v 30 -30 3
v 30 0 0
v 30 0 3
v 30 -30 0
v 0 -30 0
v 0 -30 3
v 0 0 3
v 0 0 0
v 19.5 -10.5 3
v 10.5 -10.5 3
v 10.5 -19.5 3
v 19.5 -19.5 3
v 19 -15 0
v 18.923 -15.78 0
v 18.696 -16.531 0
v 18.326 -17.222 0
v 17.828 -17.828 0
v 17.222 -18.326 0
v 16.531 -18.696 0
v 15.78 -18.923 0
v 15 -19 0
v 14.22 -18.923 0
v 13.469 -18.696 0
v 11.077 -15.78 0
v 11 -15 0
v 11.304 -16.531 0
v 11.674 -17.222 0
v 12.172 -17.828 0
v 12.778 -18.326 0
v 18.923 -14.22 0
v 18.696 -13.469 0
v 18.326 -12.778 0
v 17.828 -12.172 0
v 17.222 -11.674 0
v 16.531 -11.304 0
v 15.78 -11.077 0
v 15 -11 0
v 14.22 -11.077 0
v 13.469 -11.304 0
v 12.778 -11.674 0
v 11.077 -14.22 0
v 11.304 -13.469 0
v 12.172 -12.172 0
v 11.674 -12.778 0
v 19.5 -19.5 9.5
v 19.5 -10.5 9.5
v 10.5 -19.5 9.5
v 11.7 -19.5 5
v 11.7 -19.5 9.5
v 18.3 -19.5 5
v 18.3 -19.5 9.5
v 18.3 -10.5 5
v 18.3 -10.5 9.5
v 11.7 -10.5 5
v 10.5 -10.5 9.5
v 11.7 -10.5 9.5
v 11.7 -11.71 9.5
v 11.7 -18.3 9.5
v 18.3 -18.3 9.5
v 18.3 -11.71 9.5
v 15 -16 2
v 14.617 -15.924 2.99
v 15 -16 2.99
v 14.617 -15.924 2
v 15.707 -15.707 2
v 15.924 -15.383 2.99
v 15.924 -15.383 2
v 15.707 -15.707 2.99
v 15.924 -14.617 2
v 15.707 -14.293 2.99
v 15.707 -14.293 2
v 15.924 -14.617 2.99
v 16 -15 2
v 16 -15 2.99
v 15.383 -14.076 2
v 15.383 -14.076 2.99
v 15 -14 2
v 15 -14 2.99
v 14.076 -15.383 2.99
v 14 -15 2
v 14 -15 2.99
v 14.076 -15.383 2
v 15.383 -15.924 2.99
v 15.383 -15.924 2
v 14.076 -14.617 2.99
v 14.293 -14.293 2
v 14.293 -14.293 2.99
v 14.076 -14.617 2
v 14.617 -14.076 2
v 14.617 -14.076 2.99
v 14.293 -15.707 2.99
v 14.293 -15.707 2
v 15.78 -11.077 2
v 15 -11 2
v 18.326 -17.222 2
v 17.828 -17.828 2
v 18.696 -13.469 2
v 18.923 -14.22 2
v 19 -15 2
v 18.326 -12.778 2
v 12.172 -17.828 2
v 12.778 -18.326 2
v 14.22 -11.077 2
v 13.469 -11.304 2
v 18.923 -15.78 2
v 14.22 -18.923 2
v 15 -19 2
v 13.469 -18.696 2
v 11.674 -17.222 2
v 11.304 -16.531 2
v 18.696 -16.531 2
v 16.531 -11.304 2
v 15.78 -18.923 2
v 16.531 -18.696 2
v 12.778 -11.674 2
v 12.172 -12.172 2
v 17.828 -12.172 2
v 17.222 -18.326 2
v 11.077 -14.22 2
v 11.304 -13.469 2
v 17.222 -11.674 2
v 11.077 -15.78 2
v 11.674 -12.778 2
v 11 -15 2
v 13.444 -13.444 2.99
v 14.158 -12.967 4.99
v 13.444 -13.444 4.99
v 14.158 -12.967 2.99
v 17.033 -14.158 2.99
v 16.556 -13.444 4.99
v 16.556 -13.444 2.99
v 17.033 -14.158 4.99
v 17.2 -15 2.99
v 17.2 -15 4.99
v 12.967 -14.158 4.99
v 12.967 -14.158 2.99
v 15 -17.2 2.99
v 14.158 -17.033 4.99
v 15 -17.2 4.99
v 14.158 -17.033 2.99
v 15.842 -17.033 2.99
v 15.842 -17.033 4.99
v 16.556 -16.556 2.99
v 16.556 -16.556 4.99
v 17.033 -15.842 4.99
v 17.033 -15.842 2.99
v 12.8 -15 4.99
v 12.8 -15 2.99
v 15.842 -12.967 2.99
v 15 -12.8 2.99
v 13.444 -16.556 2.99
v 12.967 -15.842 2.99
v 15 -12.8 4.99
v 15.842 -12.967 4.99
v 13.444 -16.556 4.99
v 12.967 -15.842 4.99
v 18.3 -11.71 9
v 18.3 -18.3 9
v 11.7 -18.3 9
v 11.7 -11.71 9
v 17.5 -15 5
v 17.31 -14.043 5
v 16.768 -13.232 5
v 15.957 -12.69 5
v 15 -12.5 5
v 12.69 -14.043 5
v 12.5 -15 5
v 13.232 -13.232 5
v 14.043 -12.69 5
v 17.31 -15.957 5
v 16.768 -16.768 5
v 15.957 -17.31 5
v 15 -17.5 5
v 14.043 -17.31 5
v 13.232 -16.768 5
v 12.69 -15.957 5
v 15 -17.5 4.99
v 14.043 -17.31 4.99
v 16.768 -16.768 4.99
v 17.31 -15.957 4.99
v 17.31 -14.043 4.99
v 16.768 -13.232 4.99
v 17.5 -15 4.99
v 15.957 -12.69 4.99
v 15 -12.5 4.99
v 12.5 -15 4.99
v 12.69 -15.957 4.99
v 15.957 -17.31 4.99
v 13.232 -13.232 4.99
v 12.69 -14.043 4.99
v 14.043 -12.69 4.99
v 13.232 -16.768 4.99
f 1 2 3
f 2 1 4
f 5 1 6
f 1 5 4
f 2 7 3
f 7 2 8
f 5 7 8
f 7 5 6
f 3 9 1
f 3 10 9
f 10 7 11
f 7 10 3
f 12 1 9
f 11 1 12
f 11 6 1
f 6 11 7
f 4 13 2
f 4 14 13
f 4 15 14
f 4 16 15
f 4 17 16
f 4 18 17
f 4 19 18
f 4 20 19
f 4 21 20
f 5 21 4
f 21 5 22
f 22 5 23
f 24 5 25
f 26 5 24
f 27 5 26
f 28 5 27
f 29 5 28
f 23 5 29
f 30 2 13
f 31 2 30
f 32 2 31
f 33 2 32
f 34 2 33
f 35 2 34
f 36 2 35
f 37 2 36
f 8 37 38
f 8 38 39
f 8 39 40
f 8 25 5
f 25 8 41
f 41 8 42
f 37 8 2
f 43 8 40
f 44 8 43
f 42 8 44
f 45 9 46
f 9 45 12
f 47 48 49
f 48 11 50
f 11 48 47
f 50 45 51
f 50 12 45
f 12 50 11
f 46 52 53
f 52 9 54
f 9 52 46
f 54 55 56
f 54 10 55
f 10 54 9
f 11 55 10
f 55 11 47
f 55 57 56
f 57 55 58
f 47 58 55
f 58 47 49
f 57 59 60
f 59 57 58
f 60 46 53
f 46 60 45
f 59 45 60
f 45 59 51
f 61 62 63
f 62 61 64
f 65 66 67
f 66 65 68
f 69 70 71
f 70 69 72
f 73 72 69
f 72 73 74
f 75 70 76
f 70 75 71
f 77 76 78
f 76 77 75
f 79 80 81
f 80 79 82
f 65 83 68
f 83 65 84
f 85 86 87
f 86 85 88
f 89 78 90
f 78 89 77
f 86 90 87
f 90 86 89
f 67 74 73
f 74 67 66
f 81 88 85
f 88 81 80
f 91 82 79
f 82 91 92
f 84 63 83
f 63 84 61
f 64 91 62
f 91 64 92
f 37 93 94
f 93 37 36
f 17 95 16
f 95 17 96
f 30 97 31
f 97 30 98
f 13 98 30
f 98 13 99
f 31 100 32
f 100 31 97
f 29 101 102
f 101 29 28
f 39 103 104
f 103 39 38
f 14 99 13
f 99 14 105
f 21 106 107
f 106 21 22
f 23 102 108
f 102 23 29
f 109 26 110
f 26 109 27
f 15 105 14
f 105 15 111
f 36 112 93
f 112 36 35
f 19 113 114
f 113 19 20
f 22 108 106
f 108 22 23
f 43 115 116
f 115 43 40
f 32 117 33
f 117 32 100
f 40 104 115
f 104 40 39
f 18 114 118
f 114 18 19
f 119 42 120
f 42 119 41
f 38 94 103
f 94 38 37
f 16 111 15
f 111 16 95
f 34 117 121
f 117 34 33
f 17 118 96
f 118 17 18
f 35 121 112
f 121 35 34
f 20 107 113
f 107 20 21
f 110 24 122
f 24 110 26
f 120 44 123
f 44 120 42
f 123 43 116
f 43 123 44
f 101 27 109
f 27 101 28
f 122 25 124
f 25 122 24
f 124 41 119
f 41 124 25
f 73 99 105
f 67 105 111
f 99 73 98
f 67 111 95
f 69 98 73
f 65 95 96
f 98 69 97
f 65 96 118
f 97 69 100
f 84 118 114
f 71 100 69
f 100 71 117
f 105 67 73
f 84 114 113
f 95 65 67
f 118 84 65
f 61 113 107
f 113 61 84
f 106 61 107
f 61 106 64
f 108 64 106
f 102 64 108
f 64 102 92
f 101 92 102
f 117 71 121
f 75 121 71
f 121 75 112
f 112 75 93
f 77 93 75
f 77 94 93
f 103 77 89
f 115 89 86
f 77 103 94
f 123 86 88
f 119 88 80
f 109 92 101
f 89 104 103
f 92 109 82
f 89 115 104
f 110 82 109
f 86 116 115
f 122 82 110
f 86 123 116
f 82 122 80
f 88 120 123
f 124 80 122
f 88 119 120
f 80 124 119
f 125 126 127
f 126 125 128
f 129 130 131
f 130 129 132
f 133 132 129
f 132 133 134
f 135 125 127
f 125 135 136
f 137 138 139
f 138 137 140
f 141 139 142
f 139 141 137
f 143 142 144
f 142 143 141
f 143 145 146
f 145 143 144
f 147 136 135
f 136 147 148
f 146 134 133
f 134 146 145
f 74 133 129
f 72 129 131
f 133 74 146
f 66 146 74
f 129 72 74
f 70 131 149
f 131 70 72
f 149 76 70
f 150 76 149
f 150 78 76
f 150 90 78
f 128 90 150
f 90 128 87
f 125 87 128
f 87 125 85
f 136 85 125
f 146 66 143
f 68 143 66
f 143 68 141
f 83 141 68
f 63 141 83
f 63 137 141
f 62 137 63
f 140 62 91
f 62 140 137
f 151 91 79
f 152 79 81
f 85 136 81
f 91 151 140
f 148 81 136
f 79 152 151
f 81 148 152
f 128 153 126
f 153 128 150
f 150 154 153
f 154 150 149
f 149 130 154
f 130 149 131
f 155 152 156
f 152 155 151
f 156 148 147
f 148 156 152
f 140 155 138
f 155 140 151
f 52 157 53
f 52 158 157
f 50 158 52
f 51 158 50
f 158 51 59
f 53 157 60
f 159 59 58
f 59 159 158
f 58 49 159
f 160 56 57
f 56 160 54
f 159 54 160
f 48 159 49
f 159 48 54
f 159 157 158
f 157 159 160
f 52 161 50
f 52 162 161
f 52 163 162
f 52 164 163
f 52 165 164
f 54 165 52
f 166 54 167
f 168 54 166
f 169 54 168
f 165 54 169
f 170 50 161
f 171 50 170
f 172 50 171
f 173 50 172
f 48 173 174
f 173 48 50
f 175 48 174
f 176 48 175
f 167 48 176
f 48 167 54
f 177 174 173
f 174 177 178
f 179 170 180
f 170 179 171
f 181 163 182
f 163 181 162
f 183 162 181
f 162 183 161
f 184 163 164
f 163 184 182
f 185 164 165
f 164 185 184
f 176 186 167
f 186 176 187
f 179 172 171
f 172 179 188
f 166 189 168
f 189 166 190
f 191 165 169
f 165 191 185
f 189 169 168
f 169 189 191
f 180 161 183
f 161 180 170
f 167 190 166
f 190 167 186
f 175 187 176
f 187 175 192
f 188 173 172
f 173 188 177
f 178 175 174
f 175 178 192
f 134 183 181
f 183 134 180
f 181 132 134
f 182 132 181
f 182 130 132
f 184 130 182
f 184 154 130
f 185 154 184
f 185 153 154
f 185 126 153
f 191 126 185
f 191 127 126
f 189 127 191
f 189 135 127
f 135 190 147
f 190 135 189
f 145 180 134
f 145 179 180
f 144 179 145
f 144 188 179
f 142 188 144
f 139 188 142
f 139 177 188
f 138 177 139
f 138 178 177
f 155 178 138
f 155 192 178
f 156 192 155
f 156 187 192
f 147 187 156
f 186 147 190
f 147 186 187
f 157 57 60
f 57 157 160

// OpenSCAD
// Recal Button Cradle — Test Print
// Isolated section of back wall with snap-in cradle.
// Print this to iterate on fit without reprinting the whole enclosure.
//
// Includes: wall section, pinhole, target ring recess, snap-in cradle, ghost button.
// Print flat (wall face down on bed).

// ─── WALL SECTION ───────────────────────────────────────────────
WALL         = 3;     // wall thickness (matches enclosure)
SECTION_W    = 30;    // width of test piece (X)
SECTION_H    = 30;    // height of test piece (Z)

// ─── RECAL PINHOLE ──────────────────────────────────────────────
RECAL_D          = 2;     // pinhole diameter
RECAL_RECESS_D   = 8;     // target ring outer diameter
RECAL_RECESS_DEPTH = 2.0; // target ring depth

// ─── BUTTON DIMENSIONS ─────────────────────────────────────────
// Measure YOUR tact switch and update these if different!
BTN_W        = 6;     // body width (X)
BTN_H        = 6;     // body height (Z)
BTN_DEPTH    = 3;     // body depth (Y, measured from face to back)
BTN_TOL      = 0.3;   // clearance per side
BTN_ACT_D    = 4;     // actuator diameter
BTN_ACT_EXT  = 2;     // actuator extension beyond body face

// ─── CRADLE DESIGN ──────────────────────────────────────────────
// Total pocket depth needs to fit: actuator extension + body depth
// without the floor pressing the actuator.
CRADLE_DEPTH = BTN_DEPTH + BTN_ACT_EXT + 0.5;  // body + actuator + clearance
SNAP_T       = 1.2;   // snap tab thickness
SNAP_LIP     = 0.8;   // tab lip overhang
FLOOR_T      = 1.0;   // floor thickness behind button (between button back and air)

// Pocket interior
pocket_w = BTN_W + 2*BTN_TOL;
pocket_h = BTN_H + 2*BTN_TOL;
// Cradle outer (pocket + snap tabs on top/bottom)
cradle_w = pocket_w + 2*SNAP_T;
cradle_h = pocket_h + 2*SNAP_T;
// Total cradle protrusion from wall
cradle_total_d = CRADLE_DEPTH + FLOOR_T;

// Center of button/pinhole in the test piece
CX = SECTION_W / 2;
CZ = SECTION_H / 2;

// ─── MODULES ────────────────────────────────────────────────────

module test_piece() {
    difference() {
        union() {
            // ── Wall section ──
            // Oriented: X=width, Y=thickness(wall), Z=height
            cube([SECTION_W, WALL, SECTION_H]);

            // ── Cradle block on interior face ──
            // Protrudes inward (negative Y in enclosure, positive Y here)
            translate([CX - cradle_w/2, WALL - 0.01, CZ - cradle_h/2])
                cube([cradle_w, cradle_total_d + 0.01, cradle_h]);
        }

        // ── Pinhole through wall (exterior access) ──
        translate([CX, -0.01, CZ])
            rotate([-90, 0, 0])
                cylinder(d=RECAL_D, h=WALL + 0.02, $fn=16);

        // ── Target ring recess on exterior face ──
        translate([CX, -0.01, CZ])
            rotate([-90, 0, 0])
                cylinder(d=RECAL_RECESS_D, h=RECAL_RECESS_DEPTH + 0.01, $fn=32);

        // ── Actuator channel through wall into cradle ──
        // From wall interior face through to cradle pocket
        translate([CX, WALL - 0.01, CZ])
            rotate([-90, 0, 0])
                cylinder(d=BTN_ACT_D + 0.4, h=BTN_ACT_EXT + 1, $fn=16);

        // ── Main pocket (button body cavity) ──
        // Starts after actuator clearance zone, goes to back of cradle
        // Leave FLOOR_T at the very back so button doesn't fall through
        translate([CX - pocket_w/2,
                   WALL + BTN_ACT_EXT,
                   CZ - pocket_h/2])
            cube([pocket_w, BTN_DEPTH + 1, pocket_h]);

        // ── Plunger clearance hole in pocket floor ──
        // This is the KEY FIX: a hole so the actuator isn't pressed
        // by the pocket floor when the button sits in the cradle
        translate([CX, WALL + BTN_ACT_EXT - 0.01, CZ])
            rotate([-90, 0, 0])
                cylinder(d=BTN_ACT_D + 1, h=0.5 + 0.02, $fn=16);

        // ── Top snap tab relief (allows tab to flex outward) ──
        translate([CX - pocket_w/2,
                   WALL + BTN_ACT_EXT,
                   CZ + pocket_h/2])
            cube([pocket_w, CRADLE_DEPTH - SNAP_LIP, SNAP_T + 0.01]);

        // ── Bottom snap tab relief ──
        translate([CX - pocket_w/2,
                   WALL + BTN_ACT_EXT,
                   CZ - pocket_h/2 - SNAP_T])
            cube([pocket_w, CRADLE_DEPTH - SNAP_LIP, SNAP_T + 0.01]);
    }
}

// ─── RENDER ─────────────────────────────────────────────────────

// Print orientation: wall face (exterior) down on bed
// Rotate so the flat wall face is on the build plate
rotate([90, 0, 0])
    test_piece();

// Ghost button for reference (won't print)
%rotate([90, 0, 0])
    translate([CX - BTN_W/2,
               WALL + BTN_ACT_EXT,
               CZ - BTN_H/2])
        cube([BTN_W, BTN_DEPTH, BTN_H]);
